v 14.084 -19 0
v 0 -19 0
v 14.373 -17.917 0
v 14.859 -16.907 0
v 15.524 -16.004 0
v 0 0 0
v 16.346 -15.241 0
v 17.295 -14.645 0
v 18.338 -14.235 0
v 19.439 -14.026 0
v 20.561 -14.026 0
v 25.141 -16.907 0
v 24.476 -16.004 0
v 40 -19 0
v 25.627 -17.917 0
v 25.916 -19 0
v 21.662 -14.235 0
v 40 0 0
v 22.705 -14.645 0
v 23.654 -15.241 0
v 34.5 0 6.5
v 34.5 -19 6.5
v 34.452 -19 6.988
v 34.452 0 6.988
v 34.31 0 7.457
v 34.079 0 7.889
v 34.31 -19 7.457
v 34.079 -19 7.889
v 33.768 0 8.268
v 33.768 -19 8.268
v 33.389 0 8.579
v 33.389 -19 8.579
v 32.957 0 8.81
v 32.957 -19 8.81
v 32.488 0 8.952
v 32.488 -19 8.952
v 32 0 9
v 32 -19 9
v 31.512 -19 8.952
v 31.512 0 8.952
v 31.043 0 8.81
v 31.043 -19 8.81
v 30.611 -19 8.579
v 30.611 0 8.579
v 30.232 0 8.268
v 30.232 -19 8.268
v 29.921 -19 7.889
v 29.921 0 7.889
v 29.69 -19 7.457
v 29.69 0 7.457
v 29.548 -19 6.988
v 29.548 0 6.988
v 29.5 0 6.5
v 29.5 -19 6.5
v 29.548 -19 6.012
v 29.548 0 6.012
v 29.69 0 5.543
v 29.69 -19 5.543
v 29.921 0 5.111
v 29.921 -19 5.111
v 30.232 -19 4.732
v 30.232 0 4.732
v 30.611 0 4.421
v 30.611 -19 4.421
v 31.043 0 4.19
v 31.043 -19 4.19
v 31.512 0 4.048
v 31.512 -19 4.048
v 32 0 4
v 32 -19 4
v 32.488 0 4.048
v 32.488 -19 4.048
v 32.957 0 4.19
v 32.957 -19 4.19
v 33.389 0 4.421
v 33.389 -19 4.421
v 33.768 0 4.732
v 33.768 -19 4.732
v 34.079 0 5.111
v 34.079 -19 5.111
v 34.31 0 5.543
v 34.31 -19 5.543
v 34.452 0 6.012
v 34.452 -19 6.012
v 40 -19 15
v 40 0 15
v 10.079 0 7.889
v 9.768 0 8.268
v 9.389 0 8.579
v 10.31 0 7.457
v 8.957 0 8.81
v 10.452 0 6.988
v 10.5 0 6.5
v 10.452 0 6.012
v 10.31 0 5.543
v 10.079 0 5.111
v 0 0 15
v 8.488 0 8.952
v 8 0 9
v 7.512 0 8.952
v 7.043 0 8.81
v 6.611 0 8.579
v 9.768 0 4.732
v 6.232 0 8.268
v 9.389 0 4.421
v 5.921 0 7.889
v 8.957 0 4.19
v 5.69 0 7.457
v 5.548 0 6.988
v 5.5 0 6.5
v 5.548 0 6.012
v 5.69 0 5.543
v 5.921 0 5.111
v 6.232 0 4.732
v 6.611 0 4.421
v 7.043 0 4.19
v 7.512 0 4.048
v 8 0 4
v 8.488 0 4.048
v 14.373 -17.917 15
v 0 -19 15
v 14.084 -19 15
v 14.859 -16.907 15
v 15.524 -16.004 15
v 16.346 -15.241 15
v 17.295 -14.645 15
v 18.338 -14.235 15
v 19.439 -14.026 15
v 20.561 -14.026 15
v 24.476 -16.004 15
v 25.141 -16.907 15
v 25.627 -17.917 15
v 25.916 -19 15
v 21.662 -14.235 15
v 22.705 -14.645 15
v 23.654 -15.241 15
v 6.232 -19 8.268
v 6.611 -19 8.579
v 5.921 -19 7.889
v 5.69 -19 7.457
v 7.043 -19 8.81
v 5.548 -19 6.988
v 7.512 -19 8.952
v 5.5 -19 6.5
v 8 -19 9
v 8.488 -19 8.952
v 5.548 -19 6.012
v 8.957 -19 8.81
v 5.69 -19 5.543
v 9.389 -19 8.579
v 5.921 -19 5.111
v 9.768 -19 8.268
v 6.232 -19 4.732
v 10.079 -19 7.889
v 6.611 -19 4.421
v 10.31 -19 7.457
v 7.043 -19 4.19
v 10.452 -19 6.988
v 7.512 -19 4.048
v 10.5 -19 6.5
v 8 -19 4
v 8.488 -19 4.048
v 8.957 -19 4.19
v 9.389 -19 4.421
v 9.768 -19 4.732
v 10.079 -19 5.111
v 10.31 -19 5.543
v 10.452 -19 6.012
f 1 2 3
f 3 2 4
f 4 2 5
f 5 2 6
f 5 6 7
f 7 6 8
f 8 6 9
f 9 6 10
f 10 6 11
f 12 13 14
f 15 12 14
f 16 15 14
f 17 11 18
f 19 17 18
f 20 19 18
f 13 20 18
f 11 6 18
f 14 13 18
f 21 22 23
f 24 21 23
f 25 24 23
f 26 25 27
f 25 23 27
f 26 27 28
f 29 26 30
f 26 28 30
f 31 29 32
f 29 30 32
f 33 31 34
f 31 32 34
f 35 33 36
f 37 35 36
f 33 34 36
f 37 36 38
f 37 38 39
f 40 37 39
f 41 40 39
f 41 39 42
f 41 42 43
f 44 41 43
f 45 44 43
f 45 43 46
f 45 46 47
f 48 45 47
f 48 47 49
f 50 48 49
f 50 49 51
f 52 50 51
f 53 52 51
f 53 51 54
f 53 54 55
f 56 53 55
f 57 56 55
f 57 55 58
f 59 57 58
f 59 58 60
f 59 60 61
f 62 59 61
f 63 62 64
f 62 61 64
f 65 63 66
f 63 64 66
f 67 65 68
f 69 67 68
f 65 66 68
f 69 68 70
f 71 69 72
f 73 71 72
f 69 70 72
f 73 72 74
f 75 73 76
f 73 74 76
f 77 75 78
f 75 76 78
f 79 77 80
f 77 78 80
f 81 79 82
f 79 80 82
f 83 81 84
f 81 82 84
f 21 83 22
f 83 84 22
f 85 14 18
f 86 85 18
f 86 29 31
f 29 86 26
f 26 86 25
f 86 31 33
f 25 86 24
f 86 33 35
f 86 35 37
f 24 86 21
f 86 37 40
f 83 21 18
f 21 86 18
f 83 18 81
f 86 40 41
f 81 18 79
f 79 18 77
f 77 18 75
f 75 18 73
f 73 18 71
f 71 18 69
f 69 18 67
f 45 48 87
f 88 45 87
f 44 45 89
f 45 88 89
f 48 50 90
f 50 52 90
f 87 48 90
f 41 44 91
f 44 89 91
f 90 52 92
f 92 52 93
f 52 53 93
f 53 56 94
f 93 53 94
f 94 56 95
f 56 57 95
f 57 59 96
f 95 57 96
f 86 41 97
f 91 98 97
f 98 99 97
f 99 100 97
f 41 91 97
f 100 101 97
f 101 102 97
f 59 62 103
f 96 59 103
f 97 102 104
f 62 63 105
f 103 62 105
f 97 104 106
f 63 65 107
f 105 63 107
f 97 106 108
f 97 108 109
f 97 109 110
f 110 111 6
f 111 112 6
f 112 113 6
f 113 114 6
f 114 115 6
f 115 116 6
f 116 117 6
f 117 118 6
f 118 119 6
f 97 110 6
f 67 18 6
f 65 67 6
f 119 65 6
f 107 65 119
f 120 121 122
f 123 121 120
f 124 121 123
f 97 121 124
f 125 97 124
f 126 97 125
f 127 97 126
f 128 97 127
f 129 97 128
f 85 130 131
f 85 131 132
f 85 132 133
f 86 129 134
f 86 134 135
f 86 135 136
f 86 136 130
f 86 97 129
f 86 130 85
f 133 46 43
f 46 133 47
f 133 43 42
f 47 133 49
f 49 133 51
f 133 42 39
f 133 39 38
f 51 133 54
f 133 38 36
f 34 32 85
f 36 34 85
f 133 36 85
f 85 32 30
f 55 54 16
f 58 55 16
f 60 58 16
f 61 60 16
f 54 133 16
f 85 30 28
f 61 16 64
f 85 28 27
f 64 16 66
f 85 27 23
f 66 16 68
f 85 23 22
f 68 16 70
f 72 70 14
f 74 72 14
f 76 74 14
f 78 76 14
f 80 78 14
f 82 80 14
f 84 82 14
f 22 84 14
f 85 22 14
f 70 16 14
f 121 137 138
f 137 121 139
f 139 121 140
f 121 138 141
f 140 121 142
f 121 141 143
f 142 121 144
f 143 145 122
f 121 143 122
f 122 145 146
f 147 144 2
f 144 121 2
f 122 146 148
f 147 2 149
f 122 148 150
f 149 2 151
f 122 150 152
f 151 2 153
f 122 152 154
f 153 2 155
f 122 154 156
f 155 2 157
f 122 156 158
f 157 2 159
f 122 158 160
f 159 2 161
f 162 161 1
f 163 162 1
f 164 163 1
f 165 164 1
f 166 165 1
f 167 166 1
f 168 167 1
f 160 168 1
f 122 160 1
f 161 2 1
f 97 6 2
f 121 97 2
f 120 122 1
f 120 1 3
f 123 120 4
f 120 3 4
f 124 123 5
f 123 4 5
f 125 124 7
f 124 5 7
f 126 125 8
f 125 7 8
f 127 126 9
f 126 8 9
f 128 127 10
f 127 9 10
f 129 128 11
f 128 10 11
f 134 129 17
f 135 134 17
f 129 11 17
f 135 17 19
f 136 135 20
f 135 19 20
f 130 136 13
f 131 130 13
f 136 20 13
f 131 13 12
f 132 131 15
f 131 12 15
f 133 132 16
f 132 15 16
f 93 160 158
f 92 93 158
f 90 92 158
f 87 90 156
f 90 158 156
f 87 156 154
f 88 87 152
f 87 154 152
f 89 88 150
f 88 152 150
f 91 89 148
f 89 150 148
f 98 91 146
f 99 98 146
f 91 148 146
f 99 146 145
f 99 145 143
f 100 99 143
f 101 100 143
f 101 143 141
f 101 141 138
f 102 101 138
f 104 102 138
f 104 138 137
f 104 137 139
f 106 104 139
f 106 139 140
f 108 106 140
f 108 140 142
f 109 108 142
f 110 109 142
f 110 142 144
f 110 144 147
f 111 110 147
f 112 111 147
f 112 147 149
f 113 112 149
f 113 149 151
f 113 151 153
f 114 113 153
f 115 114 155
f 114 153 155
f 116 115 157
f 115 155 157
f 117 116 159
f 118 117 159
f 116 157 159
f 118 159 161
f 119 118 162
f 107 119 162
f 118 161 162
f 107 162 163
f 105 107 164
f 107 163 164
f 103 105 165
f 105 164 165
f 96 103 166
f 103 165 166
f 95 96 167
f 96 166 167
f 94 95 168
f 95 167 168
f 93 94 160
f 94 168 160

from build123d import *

# Parameters (mm, degrees)
F1_DEPTH = 15
F3_D     = 5


with BuildPart() as f1:
    # F0 (on Top) → F1 (new body)
    with BuildSketch(Plane.XY):
        with BuildLine():
            Line((40, 0), (0, 0))
            Line((0, 0), (0, -19))
            Line((0, -19), (14.08392, -19))
            ThreePointArc((14.08392, -19), (20, -14), (25.91608, -19))
            Line((25.91608, -19), (40, -19))
            Line((40, -19), (40, 0))
        make_face()
    extrude(amount=F1_DEPTH)

    # F3 (through all)
    with Locations(Plane(origin=(0, 0, 0), x_dir=(-1, 0, 0), z_dir=(0, 1, 0))):
        with Locations((-8, 6.5), (-32, 6.5)):
            Hole(F3_D / 2)


solid = f1.part
